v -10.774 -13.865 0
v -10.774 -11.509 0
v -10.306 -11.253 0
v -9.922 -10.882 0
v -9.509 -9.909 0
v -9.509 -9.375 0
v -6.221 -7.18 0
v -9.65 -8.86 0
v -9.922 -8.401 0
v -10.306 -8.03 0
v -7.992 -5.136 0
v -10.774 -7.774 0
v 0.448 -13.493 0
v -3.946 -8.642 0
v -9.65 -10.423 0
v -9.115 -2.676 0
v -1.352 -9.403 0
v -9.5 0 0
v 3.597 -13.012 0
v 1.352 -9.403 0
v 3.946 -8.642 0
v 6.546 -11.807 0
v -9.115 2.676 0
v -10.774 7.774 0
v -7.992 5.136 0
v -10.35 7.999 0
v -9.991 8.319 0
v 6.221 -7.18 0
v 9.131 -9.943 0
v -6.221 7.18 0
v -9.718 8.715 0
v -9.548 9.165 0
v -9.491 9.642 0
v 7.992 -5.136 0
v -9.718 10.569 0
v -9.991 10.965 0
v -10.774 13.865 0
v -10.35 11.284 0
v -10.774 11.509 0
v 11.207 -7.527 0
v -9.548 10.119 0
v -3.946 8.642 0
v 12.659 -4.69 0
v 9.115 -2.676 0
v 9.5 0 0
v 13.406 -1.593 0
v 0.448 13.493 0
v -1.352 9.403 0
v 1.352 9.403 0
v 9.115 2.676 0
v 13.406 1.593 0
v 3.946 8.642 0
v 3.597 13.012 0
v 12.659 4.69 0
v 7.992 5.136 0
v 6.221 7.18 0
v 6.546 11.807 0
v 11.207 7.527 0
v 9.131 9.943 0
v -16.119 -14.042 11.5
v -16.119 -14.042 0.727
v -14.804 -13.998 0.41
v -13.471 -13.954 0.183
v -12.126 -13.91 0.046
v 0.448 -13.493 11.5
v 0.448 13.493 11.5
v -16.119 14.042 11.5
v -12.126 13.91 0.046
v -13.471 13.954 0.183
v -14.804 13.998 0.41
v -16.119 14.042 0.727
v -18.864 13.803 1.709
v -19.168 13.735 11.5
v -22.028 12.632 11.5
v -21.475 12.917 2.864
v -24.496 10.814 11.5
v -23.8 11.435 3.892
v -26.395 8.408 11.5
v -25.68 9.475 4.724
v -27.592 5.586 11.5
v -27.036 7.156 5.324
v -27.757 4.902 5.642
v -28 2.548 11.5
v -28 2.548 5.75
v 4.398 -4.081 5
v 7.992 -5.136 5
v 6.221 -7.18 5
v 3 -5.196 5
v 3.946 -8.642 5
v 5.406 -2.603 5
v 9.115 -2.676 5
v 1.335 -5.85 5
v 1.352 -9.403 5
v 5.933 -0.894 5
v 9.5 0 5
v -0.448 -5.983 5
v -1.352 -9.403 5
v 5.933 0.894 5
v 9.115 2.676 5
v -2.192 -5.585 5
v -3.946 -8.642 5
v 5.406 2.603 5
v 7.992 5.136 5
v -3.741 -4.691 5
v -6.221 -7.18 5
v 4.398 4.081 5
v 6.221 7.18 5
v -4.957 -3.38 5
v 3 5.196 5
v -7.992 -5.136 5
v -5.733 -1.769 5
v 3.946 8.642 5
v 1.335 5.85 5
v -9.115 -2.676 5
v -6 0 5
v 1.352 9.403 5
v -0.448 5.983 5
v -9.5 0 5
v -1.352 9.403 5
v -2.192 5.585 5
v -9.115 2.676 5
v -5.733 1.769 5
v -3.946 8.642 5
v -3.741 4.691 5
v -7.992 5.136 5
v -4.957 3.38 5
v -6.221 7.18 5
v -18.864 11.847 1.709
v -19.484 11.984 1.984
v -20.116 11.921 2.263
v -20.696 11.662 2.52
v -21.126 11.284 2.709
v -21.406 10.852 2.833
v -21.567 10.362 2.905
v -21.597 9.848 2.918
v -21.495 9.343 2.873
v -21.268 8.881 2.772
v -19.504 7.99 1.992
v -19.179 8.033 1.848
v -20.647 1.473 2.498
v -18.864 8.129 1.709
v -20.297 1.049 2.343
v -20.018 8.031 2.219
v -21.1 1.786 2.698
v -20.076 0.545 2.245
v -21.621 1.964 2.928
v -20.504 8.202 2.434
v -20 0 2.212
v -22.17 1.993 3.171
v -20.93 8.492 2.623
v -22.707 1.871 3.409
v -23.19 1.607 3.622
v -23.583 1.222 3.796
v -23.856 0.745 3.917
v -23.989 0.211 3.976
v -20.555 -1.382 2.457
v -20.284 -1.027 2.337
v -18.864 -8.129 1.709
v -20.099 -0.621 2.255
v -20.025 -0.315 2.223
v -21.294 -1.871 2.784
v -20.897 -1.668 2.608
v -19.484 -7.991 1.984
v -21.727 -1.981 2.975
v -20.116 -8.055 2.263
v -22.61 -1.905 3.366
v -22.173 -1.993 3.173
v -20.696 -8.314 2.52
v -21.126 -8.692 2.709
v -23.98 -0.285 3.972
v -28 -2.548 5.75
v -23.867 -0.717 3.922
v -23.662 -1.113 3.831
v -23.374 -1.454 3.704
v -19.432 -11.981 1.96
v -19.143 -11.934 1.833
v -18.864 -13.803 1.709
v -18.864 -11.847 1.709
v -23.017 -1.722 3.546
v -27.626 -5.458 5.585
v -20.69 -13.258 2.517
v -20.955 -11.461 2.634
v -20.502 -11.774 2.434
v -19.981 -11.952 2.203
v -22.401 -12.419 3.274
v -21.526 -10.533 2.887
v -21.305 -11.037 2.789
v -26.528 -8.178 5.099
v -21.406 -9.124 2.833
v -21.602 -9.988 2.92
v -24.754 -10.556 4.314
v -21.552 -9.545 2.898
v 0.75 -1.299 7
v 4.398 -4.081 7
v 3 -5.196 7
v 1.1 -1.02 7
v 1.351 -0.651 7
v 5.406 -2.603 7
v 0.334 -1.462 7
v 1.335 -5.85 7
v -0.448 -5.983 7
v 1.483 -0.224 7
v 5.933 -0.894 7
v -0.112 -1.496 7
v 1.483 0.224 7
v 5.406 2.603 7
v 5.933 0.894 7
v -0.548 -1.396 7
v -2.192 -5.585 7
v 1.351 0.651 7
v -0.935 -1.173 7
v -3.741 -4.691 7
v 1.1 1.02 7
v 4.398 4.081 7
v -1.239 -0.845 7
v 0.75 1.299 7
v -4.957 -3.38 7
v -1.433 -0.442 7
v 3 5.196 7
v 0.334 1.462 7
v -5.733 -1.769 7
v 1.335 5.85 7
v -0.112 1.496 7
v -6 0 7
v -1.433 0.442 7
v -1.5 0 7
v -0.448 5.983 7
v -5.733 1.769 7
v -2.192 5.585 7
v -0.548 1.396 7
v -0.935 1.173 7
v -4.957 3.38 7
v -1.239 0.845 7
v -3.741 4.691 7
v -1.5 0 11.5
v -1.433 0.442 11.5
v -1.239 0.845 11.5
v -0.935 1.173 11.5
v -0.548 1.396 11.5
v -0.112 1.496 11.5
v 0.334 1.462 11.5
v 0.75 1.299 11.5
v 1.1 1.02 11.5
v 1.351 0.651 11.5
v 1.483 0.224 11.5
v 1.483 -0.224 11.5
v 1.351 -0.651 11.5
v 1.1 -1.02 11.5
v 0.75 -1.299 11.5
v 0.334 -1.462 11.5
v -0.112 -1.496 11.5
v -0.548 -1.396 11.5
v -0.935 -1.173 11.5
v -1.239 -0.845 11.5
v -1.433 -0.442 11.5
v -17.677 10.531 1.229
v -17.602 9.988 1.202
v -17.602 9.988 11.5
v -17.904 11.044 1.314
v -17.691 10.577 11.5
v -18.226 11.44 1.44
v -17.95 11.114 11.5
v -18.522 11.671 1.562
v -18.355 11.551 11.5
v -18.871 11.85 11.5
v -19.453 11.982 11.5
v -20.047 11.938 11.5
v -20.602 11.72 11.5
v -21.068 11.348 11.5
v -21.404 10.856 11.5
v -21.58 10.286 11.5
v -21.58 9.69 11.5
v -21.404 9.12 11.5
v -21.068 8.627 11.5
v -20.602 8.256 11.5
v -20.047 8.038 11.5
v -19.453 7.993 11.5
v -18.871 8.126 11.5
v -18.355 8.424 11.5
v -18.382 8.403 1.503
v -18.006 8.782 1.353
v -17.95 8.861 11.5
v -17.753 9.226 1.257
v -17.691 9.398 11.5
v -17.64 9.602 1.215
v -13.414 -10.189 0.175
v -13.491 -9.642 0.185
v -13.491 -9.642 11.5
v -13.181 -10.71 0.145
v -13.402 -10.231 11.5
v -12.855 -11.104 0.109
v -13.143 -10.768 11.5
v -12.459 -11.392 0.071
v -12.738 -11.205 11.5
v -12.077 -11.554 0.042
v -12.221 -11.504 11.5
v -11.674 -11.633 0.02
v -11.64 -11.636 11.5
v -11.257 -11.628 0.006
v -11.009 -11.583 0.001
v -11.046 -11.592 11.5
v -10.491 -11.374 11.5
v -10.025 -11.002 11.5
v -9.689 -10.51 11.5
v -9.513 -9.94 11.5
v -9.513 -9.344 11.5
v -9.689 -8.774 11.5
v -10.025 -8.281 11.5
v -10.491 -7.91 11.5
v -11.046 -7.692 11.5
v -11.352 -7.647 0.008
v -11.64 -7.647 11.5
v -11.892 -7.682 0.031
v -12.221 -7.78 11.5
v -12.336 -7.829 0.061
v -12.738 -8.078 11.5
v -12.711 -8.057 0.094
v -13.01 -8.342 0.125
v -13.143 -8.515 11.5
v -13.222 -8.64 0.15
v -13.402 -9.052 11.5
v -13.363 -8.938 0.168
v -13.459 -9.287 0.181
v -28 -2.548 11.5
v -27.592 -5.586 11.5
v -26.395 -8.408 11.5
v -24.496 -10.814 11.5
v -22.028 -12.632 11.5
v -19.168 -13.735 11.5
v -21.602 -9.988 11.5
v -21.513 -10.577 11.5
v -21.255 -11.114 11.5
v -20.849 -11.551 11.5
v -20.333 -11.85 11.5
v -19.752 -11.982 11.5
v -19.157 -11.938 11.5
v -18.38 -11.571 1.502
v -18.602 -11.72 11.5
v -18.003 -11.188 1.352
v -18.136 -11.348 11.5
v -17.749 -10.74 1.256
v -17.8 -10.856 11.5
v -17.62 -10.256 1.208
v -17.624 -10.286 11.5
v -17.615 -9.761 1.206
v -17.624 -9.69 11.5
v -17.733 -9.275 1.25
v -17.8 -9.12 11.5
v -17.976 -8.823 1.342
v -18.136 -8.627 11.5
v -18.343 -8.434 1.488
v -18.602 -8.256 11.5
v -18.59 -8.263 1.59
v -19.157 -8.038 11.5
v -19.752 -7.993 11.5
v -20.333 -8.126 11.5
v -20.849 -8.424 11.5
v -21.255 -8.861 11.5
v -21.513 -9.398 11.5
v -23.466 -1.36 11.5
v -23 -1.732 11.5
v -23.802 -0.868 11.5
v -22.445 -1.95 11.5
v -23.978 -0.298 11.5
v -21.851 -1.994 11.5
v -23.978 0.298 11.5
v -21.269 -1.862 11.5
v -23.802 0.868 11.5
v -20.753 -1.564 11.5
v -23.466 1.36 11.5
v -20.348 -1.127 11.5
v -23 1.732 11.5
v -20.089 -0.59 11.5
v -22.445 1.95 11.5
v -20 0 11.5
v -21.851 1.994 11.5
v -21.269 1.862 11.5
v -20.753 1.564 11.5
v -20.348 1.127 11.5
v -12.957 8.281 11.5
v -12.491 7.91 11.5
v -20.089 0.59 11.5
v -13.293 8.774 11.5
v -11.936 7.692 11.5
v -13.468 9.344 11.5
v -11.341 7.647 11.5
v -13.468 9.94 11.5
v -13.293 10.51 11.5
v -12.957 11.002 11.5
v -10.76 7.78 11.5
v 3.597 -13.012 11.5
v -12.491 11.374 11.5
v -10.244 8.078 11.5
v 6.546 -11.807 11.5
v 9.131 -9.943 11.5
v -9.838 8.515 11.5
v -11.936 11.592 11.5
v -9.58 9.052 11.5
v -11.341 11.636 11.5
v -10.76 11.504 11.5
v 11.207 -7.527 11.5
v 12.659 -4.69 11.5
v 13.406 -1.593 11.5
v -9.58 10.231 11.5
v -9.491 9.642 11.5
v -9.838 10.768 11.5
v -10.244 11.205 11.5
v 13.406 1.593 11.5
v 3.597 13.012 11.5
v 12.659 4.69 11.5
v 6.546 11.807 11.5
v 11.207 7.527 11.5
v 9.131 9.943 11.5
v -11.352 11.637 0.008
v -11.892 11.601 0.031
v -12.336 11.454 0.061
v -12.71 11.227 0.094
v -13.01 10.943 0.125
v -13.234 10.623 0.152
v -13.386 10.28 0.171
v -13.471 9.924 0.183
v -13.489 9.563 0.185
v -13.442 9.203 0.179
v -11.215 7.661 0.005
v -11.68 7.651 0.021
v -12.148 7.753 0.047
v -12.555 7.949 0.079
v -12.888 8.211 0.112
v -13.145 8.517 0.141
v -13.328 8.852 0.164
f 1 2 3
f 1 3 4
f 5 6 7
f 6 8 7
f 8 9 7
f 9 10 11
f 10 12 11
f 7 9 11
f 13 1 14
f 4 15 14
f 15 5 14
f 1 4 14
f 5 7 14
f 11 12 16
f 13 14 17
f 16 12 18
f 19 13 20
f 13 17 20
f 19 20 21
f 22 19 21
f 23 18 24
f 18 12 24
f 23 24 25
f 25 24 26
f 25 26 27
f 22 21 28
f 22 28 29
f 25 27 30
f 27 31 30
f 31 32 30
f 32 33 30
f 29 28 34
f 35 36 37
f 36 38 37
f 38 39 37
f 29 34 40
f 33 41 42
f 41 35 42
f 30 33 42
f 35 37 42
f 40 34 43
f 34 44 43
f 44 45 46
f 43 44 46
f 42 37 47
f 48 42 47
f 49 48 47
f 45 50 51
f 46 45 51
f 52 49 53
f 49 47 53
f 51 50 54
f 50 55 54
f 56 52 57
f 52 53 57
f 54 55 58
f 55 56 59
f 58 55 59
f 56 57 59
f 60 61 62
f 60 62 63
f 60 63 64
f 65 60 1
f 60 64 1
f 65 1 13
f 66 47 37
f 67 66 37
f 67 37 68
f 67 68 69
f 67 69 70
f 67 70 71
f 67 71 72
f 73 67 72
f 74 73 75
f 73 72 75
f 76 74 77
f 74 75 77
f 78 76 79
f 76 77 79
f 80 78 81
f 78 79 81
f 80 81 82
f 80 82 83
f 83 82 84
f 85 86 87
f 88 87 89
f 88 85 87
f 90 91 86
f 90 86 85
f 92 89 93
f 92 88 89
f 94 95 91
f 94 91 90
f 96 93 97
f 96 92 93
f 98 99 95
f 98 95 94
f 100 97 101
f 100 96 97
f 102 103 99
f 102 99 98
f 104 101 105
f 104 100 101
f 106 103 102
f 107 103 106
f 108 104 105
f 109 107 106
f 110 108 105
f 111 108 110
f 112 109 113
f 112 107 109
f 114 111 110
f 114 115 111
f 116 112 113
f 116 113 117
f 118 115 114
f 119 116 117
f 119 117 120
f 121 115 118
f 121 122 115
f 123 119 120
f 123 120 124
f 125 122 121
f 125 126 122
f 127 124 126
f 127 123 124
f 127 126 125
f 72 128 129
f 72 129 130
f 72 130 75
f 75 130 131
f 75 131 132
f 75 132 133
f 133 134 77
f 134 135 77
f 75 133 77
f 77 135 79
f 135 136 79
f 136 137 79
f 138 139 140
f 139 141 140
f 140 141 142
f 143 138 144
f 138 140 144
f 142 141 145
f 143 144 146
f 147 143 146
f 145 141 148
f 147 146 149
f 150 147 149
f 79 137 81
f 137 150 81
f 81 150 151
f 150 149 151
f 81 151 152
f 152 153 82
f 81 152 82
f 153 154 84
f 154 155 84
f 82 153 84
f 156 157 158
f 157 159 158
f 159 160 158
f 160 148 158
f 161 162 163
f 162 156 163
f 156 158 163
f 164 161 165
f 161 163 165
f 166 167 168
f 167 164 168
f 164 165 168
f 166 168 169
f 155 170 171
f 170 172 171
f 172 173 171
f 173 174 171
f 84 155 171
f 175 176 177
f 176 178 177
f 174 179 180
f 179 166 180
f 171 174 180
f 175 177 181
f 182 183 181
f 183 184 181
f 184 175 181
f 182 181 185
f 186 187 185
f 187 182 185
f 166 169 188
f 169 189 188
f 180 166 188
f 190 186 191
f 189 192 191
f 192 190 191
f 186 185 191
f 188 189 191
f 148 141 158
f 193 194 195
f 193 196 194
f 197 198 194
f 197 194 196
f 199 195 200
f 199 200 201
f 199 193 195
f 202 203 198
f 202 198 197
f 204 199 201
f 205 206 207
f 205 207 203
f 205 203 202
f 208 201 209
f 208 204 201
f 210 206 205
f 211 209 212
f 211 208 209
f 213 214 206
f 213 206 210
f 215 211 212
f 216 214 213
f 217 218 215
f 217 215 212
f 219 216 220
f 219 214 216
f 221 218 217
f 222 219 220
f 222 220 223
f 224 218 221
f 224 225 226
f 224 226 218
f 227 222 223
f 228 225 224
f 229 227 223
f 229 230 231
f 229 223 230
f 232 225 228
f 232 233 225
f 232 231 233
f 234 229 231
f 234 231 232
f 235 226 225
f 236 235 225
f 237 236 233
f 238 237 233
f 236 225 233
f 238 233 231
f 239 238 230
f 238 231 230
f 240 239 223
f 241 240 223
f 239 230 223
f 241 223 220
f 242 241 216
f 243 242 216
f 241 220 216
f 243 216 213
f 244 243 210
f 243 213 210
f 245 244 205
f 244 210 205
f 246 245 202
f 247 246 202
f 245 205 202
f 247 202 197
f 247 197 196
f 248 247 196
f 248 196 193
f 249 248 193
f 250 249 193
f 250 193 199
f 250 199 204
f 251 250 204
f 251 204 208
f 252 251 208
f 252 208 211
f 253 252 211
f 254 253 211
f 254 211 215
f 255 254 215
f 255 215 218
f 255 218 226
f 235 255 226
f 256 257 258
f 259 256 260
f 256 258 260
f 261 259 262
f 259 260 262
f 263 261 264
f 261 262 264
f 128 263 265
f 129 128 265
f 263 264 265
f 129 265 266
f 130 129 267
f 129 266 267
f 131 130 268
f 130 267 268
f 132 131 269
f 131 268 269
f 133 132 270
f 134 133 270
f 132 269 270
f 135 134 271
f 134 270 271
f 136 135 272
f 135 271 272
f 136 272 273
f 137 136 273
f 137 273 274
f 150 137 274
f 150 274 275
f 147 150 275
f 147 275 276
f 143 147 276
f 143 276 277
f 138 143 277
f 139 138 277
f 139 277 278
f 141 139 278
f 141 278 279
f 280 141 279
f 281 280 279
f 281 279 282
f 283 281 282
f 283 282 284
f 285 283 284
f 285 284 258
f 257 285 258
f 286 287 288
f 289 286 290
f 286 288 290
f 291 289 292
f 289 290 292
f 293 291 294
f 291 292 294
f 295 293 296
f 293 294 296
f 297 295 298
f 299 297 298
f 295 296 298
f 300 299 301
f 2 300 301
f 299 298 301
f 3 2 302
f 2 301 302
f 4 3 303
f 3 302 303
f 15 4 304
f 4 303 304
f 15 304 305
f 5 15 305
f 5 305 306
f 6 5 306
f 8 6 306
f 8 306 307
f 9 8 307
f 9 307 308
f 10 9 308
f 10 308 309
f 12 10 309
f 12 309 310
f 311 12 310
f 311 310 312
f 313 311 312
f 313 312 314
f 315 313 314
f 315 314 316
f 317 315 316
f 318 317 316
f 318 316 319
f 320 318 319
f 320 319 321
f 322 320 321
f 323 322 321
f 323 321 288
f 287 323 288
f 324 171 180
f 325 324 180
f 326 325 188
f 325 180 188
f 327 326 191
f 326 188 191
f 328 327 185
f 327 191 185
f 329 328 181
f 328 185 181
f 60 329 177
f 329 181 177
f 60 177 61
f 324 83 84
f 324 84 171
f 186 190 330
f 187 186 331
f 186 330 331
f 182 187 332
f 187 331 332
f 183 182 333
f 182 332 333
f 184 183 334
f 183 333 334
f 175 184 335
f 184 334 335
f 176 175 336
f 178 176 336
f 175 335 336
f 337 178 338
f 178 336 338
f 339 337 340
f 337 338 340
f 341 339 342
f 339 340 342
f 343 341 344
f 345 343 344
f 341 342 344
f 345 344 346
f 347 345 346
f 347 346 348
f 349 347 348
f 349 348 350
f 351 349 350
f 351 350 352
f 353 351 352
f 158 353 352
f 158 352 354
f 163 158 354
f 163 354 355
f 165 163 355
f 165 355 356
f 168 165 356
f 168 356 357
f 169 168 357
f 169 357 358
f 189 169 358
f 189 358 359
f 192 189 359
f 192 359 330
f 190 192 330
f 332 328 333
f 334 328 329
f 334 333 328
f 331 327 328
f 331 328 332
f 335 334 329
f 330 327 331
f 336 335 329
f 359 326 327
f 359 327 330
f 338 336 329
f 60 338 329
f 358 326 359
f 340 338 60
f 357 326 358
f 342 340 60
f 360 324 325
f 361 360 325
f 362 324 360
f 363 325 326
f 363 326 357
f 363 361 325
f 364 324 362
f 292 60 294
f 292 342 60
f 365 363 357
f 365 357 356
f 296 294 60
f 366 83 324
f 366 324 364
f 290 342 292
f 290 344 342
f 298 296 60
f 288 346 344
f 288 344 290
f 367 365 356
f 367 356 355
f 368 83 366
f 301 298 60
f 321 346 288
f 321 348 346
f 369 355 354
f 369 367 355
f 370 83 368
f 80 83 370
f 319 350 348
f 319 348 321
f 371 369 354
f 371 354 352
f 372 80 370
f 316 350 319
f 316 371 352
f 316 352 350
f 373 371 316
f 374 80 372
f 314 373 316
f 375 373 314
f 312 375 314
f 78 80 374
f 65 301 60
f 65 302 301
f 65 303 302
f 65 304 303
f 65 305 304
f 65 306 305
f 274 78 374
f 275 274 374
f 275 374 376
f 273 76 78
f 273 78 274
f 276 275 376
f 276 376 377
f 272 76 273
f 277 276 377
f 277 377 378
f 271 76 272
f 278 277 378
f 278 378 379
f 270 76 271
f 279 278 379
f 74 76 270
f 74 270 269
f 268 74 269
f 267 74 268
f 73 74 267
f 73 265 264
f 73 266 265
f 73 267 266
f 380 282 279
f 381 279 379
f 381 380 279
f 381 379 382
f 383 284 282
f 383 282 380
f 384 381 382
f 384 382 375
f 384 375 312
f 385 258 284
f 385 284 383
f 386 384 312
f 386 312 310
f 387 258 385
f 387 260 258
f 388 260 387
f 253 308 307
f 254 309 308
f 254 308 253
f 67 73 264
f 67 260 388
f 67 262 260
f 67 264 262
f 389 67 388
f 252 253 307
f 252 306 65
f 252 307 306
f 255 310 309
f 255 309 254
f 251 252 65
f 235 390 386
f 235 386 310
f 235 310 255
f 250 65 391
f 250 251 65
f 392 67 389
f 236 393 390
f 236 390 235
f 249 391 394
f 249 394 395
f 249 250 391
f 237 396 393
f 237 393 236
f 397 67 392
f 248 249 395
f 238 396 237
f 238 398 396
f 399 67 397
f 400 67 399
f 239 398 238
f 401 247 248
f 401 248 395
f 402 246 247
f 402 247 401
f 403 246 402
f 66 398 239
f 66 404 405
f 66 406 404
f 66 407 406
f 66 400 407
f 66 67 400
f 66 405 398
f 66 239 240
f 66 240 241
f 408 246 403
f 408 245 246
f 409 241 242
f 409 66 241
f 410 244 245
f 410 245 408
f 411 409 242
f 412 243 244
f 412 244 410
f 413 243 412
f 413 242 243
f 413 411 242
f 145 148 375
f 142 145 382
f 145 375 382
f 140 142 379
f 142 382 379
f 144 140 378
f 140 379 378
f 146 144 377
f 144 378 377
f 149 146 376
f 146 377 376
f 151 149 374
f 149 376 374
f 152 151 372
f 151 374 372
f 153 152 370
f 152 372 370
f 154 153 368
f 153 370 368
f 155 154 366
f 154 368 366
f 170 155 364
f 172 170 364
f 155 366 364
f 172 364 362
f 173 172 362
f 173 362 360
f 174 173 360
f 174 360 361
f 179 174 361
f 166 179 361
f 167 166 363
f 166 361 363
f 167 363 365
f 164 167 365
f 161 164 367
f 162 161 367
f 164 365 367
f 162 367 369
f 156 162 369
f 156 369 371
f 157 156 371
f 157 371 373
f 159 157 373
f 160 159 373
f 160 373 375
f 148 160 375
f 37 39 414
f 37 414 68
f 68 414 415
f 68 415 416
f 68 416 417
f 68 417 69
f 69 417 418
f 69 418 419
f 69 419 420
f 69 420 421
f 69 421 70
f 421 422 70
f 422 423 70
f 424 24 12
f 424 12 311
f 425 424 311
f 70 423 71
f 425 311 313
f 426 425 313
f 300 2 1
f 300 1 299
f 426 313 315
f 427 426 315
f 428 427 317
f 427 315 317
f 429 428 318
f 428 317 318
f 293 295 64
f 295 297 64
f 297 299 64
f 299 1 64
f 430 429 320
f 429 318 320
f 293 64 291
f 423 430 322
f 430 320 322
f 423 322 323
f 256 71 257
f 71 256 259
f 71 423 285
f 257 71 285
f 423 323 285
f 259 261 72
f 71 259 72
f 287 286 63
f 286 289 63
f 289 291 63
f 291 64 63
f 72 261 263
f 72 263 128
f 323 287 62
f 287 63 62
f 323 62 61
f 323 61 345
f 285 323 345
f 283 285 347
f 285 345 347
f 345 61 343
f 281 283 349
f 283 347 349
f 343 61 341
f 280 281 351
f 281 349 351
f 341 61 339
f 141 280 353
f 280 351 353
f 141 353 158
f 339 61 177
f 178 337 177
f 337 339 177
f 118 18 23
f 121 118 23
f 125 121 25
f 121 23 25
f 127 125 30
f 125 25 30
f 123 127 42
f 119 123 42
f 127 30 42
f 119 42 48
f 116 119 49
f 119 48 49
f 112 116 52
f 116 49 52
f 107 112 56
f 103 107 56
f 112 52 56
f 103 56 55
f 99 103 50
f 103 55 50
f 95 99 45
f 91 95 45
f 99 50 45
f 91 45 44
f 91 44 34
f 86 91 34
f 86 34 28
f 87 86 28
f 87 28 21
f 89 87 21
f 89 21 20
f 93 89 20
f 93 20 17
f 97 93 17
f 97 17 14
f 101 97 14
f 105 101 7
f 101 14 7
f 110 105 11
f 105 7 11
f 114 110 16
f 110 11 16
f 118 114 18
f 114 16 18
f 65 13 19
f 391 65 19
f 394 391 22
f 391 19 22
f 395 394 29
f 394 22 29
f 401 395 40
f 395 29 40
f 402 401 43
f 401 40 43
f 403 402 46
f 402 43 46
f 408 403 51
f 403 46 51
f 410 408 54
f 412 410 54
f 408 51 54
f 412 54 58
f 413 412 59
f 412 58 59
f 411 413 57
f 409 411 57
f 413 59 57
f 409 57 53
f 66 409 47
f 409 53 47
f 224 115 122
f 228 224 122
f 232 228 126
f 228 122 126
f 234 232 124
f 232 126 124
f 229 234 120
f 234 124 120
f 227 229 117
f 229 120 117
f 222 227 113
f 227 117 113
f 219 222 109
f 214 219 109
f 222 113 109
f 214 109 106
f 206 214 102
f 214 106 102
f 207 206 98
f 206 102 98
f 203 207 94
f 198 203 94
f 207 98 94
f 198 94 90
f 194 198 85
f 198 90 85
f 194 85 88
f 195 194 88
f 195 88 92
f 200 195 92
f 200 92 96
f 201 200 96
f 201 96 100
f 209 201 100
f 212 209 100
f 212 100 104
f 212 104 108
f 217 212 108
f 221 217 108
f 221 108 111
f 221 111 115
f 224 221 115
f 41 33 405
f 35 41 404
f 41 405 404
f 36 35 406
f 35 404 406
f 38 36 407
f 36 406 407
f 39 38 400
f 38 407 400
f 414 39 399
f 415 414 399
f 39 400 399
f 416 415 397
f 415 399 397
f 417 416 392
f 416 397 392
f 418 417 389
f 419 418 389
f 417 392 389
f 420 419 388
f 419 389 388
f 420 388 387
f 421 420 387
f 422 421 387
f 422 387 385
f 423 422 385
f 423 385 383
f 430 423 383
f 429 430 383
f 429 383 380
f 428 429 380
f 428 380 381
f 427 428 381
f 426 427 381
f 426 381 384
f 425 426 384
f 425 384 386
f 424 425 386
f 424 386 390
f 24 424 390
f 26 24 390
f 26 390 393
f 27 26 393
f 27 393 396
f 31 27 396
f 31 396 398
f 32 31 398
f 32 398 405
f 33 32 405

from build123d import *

# Parameters (mm, degrees)
CROQUIS1_R                 = 13.5
SALIENTE_EXTRUIR1_DEPTH    = 11.5
CROQUIS3_R                 = 2
CORTAR_EXTRUIR1_DEPTH      = 34.535832747
CORTAR_EXTRUIR2_DEPTH      = 34.535832747
CORTAR_EXTRUIR2_DEPTH_BACK = 34.535832747
REDONDEO1_R                = 20
REDONDEO2_R                = 11.5
CROQUIS5_R                 = 6
CORTAR_EXTRUIR3_DEPTH      = 7
CROQUIS6_R                 = 9.5
CORTAR_EXTRUIR4_DEPTH      = 5
CROQUIS7_R                 = 1.5
CORTAR_EXTRUIR5_DEPTH      = 33.099173306


with BuildPart() as part:
    # Croquis1 → Saliente-Extruir1 (new body)
    with BuildSketch(Plane.XY):
        with BuildLine():
            Line((0.447526726, 13.492580177), (-28, 14.436137919))
            Line((-28, 14.436137919), (-28, -14.436137919))
            Line((-28, -14.436137919), (0.447526726, -13.492580177))
            ThreePointArc((0.447526726, -13.492580177), (-13.5, 0), (0.447526726, 13.492580177))
        make_face()
        Circle(CROQUIS1_R)
    extrude(amount=SALIENTE_EXTRUIR1_DEPTH)

    # Croquis3 → Cortar-Extruir1 (cut, through all)
    with BuildSketch(Plane.XY.offset(11.5)):
        with Locations((-22, 0)):
            Circle(CROQUIS3_R)
        with Locations((-19.602143532, 9.987790994)):
            Circle(CROQUIS3_R)
        with Locations((-11.490666647, 9.641814145)):
            Circle(CROQUIS3_R)
        with Locations(Location((-19.602143532, -9.987790994, 0), (0, 0, 180))):
            Circle(CROQUIS3_R)
        with Locations(Location((-11.490666647, -9.641814145, 0), (0, 0, 180))):
            Circle(CROQUIS3_R)
    extrude(amount=-CORTAR_EXTRUIR1_DEPTH, mode=Mode.SUBTRACT)

    # Croquis4 → Cortar-Extruir2 (cut, two sides: drawn at the far end of the back side and taken through both)
    with BuildSketch(Plane(origin=(0, 0, 0), x_dir=(1, 0, 0), z_dir=(0, 1, 0)).offset(-CORTAR_EXTRUIR2_DEPTH_BACK)):
        Polygon((-15, 0), (-28, -5.75), (-28, 0), align=None)
    extrude(amount=CORTAR_EXTRUIR2_DEPTH + CORTAR_EXTRUIR2_DEPTH_BACK, mode=Mode.SUBTRACT)

    # Redondeo1
    # the kernel refuses this fillet: 20 mm, written as the material it takes off along each edge
    with BuildSketch(Plane(origin=(-15, -24.56902732, 0), x_dir=(1, 0, 0), z_dir=(0, 1, 0))) as redondeo1_piece_1:
        with BuildLine():
            CenterArc((REDONDEO1_R * 0.211281561014, -REDONDEO1_R), REDONDEO1_R, 90, 23.860175191)
            Line((-REDONDEO1_R * 0.193224453764, -REDONDEO1_R * 0.0854646622417), (0, 0))
            Line((0, 0), (REDONDEO1_R * 0.211281561014, 0))
        make_face()
    extrude(amount=49.138054639, mode=Mode.SUBTRACT)

    # Redondeo2
    # the kernel refuses this fillet: 11.5 mm, written as the material it takes off along each edge
    with BuildSketch(Plane(origin=(-28, 14.436137919, -23.969400449), x_dir=(0.9994503834734472, -0.033150127824481866, 0), z_dir=(0, 0, 1))) as redondeo2_piece_1:
        with BuildLine():
            CenterArc((REDONDEO2_R * 1.03371827647, -REDONDEO2_R), REDONDEO2_R, 90, 91.899710465)
            Line((REDONDEO2_R * 0.0342678929996, -REDONDEO2_R * 1.03315012782), (0, 0))
            Line((0, 0), (REDONDEO2_R * 1.03371827647, 0))
        make_face()
    extrude(amount=65.188800897, mode=Mode.SUBTRACT)
    with BuildSketch(Plane(origin=(-28, -14.436137919, -23.969400449), x_dir=(0.999450383473447, 0.033150127824482116, 0), z_dir=(0, 0, 1))) as redondeo2_piece_2:
        with BuildLine():
            CenterArc((REDONDEO2_R * 1.03371827647, REDONDEO2_R), REDONDEO2_R, 178.100289535, 91.899710465)
            Line((REDONDEO2_R * 0.0342678929996, REDONDEO2_R * 1.03315012782), (0, 0))
            Line((0, 0), (REDONDEO2_R * 1.03371827647, 0))
        make_face()
    extrude(amount=65.188800897, mode=Mode.SUBTRACT)

    # Croquis5 → Cortar-Extruir3 (cut)
    with BuildSketch(Plane(origin=(0, 0, 0), x_dir=(-1, 0, 0), z_dir=(0, 0, -1))):
        Circle(CROQUIS5_R)
    extrude(amount=-CORTAR_EXTRUIR3_DEPTH, mode=Mode.SUBTRACT)

    # Croquis6 → Cortar-Extruir4 (cut)
    with BuildSketch(Plane(origin=(0, 0, 0), x_dir=(-1, 0, 0), z_dir=(0, 0, -1))):
        Circle(CROQUIS6_R)
    extrude(amount=-CORTAR_EXTRUIR4_DEPTH, mode=Mode.SUBTRACT)

    # Croquis7 → Cortar-Extruir5 (cut, through all)
    with BuildSketch(Plane(origin=(0, 0, 7), x_dir=(-1, 0, 0), z_dir=(0, 0, -1))):
        Circle(CROQUIS7_R)
    extrude(amount=-CORTAR_EXTRUIR5_DEPTH, mode=Mode.SUBTRACT)


solid = part.part
